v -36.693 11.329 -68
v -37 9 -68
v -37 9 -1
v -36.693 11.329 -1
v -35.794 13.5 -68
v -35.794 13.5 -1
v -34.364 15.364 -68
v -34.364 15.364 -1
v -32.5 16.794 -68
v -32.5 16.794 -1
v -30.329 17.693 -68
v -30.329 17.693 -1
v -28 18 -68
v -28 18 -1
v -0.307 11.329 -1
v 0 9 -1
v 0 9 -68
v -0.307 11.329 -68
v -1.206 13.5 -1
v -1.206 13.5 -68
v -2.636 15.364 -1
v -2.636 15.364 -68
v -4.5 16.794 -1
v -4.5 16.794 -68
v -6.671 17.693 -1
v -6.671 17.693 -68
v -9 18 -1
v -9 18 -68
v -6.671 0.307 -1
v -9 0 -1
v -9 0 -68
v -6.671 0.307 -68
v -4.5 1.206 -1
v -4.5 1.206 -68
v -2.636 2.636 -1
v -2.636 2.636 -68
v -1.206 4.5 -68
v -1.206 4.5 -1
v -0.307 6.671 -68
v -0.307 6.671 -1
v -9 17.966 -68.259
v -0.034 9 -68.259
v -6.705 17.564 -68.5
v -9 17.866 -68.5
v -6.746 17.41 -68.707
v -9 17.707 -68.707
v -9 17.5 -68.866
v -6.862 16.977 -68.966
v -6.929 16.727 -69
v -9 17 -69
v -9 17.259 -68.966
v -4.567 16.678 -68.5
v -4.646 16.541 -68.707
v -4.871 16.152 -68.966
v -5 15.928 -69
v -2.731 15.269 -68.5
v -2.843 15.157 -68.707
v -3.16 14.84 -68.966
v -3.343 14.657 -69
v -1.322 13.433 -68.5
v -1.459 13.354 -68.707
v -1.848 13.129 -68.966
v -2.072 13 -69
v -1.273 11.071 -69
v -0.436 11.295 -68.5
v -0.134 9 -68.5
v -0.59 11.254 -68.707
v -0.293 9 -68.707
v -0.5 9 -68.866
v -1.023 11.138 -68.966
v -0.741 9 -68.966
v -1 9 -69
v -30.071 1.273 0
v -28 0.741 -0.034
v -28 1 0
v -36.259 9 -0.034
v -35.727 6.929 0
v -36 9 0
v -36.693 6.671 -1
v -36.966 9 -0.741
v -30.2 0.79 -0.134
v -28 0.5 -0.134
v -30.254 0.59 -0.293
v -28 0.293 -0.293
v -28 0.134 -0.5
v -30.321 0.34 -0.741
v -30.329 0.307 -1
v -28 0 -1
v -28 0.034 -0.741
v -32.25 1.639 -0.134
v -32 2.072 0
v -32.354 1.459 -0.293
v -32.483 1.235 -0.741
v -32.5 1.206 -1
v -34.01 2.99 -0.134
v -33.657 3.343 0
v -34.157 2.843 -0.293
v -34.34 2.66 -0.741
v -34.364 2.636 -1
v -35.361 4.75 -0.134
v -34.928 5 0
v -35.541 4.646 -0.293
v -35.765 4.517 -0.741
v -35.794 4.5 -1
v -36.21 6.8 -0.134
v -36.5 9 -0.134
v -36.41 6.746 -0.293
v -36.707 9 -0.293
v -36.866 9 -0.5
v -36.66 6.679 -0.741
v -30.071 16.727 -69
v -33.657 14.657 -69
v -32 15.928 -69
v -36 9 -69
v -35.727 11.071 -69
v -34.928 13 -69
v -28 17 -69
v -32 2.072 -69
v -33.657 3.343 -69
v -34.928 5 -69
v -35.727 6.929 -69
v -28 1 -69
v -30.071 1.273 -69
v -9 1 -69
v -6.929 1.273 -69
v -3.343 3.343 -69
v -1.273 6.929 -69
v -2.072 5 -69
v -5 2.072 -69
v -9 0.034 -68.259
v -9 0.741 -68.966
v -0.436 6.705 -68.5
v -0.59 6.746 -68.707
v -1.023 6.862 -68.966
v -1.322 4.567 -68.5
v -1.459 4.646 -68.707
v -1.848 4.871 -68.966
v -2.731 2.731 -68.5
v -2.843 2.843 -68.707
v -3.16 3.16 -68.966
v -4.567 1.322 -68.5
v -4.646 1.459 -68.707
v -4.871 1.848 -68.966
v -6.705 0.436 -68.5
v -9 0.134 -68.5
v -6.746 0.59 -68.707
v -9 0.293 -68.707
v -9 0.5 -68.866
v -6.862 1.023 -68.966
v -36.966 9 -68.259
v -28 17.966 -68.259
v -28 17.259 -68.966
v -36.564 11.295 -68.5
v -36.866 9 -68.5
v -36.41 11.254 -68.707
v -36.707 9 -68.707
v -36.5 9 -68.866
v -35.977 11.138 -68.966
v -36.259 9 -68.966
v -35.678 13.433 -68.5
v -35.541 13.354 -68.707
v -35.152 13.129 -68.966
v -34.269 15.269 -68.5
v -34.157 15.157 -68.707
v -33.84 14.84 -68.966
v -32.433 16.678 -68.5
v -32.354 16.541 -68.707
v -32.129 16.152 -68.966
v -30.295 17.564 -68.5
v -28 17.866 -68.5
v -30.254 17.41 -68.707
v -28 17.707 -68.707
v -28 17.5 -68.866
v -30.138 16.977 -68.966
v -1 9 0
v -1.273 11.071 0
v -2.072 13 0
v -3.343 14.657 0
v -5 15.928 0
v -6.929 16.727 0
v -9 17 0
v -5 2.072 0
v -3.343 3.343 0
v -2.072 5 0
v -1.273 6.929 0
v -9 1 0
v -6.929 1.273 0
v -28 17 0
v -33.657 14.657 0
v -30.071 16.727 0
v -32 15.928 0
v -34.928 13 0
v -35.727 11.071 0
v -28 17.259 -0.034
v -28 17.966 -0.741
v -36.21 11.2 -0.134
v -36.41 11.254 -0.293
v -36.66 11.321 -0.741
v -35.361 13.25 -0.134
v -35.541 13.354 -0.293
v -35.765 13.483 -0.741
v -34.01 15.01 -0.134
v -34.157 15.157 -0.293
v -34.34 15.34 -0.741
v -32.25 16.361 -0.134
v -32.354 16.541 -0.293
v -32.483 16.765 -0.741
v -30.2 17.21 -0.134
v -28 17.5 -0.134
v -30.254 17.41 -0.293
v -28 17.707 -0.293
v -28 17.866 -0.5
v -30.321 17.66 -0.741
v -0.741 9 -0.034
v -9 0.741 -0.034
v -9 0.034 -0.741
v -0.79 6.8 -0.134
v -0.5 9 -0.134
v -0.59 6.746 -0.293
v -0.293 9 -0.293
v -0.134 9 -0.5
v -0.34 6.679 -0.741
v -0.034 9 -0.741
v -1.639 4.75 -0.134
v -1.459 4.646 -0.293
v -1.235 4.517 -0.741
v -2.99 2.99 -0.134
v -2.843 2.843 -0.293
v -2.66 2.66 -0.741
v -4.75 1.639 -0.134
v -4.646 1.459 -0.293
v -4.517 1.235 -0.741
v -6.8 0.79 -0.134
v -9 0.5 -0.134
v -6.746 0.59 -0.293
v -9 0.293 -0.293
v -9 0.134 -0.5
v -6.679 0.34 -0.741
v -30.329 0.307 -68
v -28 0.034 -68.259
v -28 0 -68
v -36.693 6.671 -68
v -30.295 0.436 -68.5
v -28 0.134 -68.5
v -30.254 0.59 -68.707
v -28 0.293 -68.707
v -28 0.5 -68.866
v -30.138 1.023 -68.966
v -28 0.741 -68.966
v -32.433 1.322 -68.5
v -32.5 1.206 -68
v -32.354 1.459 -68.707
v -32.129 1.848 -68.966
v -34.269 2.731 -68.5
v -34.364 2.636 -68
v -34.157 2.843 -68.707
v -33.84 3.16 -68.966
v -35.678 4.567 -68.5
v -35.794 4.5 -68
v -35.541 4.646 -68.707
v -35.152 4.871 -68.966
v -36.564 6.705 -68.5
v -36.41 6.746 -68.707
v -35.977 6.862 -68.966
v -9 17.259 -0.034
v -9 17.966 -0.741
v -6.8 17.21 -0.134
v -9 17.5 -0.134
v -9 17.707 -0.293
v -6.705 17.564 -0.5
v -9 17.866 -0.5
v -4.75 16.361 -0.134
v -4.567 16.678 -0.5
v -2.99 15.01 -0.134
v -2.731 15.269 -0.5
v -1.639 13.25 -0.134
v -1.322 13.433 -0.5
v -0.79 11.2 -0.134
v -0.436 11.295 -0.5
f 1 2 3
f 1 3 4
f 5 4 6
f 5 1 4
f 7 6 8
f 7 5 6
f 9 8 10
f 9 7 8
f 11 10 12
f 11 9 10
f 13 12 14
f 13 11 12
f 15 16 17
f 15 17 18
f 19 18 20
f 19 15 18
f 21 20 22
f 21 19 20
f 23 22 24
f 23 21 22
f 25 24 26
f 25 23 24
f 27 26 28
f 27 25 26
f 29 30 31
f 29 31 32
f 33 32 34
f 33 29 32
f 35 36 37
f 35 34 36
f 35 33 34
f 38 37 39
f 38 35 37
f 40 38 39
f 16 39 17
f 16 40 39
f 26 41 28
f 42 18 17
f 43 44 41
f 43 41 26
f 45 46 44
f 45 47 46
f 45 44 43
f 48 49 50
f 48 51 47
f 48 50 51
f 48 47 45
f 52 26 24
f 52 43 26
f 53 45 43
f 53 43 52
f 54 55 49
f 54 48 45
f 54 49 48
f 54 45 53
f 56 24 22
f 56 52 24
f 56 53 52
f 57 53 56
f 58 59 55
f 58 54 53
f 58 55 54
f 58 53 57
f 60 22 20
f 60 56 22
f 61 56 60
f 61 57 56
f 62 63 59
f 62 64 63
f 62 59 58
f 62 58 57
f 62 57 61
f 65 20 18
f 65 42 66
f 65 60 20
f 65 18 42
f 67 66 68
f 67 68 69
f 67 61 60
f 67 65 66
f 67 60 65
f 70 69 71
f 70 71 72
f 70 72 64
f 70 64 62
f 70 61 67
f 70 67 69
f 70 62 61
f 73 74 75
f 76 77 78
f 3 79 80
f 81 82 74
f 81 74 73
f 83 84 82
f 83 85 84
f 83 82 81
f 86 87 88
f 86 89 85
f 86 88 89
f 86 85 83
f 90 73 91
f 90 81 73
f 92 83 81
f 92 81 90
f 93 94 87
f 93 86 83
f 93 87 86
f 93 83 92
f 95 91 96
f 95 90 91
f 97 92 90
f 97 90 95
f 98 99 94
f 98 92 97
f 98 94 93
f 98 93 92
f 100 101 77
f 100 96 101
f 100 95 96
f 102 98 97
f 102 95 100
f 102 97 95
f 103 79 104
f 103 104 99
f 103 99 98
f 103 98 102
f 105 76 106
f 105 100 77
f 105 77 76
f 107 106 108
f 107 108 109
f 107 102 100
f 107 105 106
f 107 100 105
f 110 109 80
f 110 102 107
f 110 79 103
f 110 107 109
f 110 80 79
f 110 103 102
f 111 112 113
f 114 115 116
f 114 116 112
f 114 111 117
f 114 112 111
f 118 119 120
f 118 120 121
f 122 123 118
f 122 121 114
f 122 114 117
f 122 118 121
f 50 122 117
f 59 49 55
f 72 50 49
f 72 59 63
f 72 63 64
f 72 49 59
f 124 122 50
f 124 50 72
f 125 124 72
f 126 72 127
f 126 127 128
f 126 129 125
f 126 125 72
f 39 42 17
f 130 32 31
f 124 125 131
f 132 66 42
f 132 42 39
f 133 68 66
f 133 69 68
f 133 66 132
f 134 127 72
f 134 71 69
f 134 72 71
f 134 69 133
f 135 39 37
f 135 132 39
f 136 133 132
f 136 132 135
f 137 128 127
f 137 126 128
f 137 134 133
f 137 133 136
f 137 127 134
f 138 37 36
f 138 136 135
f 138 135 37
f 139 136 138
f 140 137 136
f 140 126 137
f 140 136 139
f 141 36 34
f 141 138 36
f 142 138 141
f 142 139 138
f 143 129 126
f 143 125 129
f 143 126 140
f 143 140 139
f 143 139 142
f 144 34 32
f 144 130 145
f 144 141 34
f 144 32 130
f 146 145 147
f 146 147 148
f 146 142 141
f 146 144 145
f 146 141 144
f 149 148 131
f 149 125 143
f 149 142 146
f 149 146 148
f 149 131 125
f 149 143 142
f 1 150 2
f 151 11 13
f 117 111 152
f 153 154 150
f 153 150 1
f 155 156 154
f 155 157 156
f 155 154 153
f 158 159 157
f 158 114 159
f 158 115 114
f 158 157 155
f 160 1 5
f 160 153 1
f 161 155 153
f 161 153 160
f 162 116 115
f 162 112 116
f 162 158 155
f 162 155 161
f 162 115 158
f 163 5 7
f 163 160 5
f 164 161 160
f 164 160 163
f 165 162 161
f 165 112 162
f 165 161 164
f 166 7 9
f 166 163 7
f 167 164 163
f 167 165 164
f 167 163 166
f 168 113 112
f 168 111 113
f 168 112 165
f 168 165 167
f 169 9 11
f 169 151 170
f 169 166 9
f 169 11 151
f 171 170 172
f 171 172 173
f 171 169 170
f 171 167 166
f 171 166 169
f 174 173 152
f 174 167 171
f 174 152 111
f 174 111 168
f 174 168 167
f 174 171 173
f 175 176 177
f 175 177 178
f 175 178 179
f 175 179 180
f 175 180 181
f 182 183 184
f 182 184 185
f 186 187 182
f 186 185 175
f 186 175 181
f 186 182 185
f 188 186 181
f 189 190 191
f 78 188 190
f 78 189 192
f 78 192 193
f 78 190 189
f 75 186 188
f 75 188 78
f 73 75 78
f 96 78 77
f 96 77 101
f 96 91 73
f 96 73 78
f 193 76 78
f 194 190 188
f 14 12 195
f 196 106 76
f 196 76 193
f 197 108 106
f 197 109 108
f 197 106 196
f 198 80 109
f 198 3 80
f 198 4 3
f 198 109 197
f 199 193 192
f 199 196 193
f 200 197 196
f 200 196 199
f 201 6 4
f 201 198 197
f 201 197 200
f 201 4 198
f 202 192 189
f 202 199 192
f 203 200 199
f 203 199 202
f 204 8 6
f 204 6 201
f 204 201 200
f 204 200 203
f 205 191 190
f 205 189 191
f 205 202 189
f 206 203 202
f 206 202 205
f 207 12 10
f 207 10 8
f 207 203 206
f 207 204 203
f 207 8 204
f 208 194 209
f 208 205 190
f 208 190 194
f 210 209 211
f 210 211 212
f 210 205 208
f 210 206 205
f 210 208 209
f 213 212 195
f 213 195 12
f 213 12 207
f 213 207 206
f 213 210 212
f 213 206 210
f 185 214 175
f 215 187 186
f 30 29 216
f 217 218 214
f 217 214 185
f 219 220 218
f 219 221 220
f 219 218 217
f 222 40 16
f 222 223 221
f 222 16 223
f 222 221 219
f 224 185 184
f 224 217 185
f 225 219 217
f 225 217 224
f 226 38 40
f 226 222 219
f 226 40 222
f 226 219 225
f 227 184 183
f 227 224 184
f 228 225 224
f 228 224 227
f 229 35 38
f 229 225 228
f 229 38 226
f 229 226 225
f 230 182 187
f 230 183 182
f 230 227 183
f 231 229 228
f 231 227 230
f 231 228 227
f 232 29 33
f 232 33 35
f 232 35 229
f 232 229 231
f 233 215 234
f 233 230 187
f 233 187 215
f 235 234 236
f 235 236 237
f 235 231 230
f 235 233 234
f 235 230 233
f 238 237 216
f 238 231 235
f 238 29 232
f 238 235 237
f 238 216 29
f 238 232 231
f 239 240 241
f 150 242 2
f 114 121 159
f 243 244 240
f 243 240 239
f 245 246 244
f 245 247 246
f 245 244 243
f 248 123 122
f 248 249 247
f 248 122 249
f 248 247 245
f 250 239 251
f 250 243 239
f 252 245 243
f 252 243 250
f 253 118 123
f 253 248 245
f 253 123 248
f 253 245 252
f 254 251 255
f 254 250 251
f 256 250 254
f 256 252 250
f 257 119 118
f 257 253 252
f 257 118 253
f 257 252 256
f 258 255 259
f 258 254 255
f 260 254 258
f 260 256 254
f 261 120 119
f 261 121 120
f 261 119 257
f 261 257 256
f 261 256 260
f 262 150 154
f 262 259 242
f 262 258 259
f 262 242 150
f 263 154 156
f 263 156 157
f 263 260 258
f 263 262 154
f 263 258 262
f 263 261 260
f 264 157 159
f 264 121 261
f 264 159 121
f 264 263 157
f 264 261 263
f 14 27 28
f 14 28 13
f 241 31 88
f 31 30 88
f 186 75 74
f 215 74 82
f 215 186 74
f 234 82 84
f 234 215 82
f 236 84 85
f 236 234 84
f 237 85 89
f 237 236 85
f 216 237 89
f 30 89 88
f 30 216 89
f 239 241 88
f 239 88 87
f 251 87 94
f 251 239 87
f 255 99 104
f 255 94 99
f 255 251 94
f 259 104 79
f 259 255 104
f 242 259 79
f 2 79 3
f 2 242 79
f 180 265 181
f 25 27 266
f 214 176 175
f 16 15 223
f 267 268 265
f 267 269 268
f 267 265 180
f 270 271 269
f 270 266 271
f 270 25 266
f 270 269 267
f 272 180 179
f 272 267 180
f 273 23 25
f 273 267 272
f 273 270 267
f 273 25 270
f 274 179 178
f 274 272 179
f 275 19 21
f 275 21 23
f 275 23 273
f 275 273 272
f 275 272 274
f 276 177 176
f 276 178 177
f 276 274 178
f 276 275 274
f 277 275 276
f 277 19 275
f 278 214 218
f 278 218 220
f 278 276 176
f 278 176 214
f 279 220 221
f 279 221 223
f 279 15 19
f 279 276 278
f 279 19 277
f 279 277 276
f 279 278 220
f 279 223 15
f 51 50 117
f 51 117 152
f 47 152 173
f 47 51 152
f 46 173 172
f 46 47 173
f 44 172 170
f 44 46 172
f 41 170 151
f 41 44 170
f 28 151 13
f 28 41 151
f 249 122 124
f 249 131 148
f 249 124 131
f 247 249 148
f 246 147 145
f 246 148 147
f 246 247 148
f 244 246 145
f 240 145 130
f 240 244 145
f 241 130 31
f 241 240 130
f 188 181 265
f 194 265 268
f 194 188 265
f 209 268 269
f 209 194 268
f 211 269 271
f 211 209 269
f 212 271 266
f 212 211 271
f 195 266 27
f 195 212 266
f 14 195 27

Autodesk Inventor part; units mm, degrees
ref_plane "YZ Plane" through (0, 0, 0) normal (1, 0, 0) x (0, 1, 0)
ref_plane "XZ Plane" through (0, 0, 0) normal (0, 1, 0) x (-1, 0, 0)
ref_plane "XY Plane" through (0, 0, 0) normal (0, 0, 1) x (1, 0, 0)
sketch "Sketch1" plane through (0, 0, 0) normal (0, 1, 0) x (-1, 0, 0)
  line L0 (0, 0) -> (37, 0)
  line L1 (37, 0) -> (37, -69)
  line L2 (37, -69) -> (0, -69)
  line L3 (0, -69) -> (0, 0)
  dimension "d0" = 37
  dimension "d1" = 69
extrude "Extrusion1" add sketch "Sketch1" along normal blind 18
fillet "Fillet1" radius 9 4 edges at (0, 18, -34.5) (0, 0, -34.5) (-37, 18, -34.5) (-37, 0, -34.5)
fillet "Fillet2" radius 1 8 edges at (-2.636, 15.364, 0) (-18.5, 0, 0) (-34.364, 15.364, 0) (-18.5, 18, 0) (-34.364, 15.364, -69) (-18.5, 0, -69) (-2.636, 15.364, -69) (-18.5, 18, -69)
properties part number "4400mAh-LiIon-Battery"
